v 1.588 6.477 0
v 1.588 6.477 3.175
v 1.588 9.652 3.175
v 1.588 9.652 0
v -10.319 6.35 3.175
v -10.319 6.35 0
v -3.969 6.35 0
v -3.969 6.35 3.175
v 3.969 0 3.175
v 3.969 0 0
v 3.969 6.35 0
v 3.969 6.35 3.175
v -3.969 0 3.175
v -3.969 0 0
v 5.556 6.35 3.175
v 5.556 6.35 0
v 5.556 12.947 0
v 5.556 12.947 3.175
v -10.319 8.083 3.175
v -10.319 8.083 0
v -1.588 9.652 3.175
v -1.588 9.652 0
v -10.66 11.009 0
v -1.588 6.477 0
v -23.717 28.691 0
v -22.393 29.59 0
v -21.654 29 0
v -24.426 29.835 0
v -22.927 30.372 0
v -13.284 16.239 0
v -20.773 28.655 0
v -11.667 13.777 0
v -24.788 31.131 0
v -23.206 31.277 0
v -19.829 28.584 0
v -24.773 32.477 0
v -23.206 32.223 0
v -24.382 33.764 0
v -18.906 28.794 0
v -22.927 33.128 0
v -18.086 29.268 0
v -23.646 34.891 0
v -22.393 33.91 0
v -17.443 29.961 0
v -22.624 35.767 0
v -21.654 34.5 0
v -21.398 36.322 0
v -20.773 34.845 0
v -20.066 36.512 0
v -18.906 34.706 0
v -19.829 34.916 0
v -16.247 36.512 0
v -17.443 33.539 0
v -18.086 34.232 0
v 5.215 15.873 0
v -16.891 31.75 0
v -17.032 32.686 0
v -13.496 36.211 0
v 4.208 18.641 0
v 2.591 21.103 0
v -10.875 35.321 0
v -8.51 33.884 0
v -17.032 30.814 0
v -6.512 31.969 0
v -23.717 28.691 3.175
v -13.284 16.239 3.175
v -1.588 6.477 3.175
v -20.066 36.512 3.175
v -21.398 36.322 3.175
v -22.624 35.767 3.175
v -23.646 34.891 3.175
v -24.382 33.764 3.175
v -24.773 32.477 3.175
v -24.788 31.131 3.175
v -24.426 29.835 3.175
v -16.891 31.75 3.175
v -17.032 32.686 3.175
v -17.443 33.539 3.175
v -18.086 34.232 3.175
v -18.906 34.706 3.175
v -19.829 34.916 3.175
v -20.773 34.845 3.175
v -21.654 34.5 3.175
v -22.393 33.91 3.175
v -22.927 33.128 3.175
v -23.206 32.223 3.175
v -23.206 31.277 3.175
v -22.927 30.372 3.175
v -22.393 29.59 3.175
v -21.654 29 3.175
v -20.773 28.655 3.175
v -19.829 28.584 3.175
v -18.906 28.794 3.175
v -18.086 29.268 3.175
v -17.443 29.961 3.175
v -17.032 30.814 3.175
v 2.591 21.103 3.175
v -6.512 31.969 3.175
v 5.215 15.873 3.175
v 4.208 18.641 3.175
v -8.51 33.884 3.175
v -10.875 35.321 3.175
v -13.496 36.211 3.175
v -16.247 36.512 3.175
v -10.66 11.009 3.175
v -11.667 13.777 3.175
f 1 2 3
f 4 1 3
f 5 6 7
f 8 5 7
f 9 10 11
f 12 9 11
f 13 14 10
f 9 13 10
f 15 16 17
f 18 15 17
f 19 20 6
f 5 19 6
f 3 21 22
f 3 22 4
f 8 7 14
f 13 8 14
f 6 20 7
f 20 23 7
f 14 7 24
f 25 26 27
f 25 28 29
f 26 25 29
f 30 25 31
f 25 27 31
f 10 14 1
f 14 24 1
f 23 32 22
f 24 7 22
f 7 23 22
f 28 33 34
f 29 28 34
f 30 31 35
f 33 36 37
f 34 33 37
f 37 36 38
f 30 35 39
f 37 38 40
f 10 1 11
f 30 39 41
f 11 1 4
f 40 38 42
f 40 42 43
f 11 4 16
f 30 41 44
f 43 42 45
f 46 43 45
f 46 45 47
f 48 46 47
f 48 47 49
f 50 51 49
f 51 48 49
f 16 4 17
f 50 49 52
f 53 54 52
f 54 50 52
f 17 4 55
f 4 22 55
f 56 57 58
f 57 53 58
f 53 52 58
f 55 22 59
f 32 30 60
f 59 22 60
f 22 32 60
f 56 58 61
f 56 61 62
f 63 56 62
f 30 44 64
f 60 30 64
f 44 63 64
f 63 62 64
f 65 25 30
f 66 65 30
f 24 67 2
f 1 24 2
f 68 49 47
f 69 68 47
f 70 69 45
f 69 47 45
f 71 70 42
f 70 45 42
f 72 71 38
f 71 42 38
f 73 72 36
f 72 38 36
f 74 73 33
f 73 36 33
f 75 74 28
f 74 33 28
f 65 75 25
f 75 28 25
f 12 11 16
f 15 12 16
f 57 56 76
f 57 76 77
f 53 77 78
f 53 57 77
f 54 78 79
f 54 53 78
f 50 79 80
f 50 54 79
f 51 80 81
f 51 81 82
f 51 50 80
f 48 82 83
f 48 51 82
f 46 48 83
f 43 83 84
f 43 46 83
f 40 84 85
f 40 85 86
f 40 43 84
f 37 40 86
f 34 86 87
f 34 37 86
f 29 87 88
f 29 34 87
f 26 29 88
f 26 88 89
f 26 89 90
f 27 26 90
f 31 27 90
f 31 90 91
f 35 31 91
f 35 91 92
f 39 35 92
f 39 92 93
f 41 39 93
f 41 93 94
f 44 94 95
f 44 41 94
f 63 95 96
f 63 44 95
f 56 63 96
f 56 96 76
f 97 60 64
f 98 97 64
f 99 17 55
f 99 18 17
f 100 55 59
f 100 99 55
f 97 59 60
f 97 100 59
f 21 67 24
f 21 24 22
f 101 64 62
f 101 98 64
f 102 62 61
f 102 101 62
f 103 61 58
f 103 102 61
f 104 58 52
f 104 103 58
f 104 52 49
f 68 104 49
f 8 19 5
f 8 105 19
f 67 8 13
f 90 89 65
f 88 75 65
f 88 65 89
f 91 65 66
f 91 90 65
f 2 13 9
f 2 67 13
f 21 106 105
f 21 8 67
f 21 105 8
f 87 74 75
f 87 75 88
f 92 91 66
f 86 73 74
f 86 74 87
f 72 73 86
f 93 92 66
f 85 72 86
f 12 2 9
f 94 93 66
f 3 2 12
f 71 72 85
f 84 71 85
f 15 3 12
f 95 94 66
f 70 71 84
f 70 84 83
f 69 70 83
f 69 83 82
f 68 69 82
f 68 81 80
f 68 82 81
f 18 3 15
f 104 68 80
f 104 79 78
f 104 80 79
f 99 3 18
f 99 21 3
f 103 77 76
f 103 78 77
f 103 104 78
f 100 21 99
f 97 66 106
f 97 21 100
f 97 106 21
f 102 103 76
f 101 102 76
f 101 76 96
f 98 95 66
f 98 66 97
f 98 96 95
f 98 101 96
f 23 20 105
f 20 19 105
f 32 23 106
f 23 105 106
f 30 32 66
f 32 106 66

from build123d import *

# Parameters (mm, degrees)
SKETCH1_R           = 3.175
BOSS_EXTRUDE1_DEPTH = 3.175
CUT_EXTRUDE1_REACH  = 5.175
SKETCH2_W           = 3.175
SKETCH2_H           = 3.175
FILLET1_R           = 12.7


with BuildPart() as part:
    # Sketch1 → Boss-Extrude1 (new body)
    with BuildSketch(Plane.XY):
        with BuildLine():
            Line((-3.96875, 0), (3.96875, 0))
            Line((3.96875, 0), (3.96875, 6.35))
            Line((3.96875, 6.35), (5.55625, 6.35))
            Line((5.55625, 6.35), (5.55625, 17.564325962))
            Line((5.55625, 17.564325962), (-10.31875, 36.5125))
            Line((-10.31875, 36.5125), (-20.066, 36.5125))
            ThreePointArc((-20.066, 36.5125), (-24.38152939, 33.764351592), (-23.716600944, 28.691484184))
            Line((-23.716600944, 28.691484184), (-10.31875, 12.7))
            Line((-10.31875, 12.7), (-10.31875, 6.35))
            Line((-10.31875, 6.35), (-3.96875, 6.35))
            Line((-3.96875, 6.35), (-3.96875, 0))
        make_face()
        with Locations((-20.066, 31.75)):
            Circle(SKETCH1_R, mode=Mode.SUBTRACT)
    extrude(amount=BOSS_EXTRUDE1_DEPTH)

    # Sketch2 → Cut-Extrude1 (cut, up to next)
    with BuildSketch(Plane.XY.offset(3.175), mode=Mode.PRIVATE) as cut_extrude1_sk1:
        with Locations((0, 8.0645)):
            Rectangle(SKETCH2_W, SKETCH2_H)
    cut_extrude1_tool1 = extrude(cut_extrude1_sk1.sketch, amount=-CUT_EXTRUDE1_REACH, mode=Mode.PRIVATE) & part.part
    add(cut_extrude1_tool1.solids().sort_by_distance((0, 8.0645, 3.175))[0], mode=Mode.SUBTRACT)

    # Fillet1
    fillet1_edges = [part.edges().sort_by_distance(p)[0] for p in [
        (-10.31875, 12.7, 1.5875),
        (-10.31875, 36.5125, 1.5875),
        (5.55625, 17.564325962, 1.5875),
    ]]
    fillet(fillet1_edges, radius=FILLET1_R)


solid = part.part
